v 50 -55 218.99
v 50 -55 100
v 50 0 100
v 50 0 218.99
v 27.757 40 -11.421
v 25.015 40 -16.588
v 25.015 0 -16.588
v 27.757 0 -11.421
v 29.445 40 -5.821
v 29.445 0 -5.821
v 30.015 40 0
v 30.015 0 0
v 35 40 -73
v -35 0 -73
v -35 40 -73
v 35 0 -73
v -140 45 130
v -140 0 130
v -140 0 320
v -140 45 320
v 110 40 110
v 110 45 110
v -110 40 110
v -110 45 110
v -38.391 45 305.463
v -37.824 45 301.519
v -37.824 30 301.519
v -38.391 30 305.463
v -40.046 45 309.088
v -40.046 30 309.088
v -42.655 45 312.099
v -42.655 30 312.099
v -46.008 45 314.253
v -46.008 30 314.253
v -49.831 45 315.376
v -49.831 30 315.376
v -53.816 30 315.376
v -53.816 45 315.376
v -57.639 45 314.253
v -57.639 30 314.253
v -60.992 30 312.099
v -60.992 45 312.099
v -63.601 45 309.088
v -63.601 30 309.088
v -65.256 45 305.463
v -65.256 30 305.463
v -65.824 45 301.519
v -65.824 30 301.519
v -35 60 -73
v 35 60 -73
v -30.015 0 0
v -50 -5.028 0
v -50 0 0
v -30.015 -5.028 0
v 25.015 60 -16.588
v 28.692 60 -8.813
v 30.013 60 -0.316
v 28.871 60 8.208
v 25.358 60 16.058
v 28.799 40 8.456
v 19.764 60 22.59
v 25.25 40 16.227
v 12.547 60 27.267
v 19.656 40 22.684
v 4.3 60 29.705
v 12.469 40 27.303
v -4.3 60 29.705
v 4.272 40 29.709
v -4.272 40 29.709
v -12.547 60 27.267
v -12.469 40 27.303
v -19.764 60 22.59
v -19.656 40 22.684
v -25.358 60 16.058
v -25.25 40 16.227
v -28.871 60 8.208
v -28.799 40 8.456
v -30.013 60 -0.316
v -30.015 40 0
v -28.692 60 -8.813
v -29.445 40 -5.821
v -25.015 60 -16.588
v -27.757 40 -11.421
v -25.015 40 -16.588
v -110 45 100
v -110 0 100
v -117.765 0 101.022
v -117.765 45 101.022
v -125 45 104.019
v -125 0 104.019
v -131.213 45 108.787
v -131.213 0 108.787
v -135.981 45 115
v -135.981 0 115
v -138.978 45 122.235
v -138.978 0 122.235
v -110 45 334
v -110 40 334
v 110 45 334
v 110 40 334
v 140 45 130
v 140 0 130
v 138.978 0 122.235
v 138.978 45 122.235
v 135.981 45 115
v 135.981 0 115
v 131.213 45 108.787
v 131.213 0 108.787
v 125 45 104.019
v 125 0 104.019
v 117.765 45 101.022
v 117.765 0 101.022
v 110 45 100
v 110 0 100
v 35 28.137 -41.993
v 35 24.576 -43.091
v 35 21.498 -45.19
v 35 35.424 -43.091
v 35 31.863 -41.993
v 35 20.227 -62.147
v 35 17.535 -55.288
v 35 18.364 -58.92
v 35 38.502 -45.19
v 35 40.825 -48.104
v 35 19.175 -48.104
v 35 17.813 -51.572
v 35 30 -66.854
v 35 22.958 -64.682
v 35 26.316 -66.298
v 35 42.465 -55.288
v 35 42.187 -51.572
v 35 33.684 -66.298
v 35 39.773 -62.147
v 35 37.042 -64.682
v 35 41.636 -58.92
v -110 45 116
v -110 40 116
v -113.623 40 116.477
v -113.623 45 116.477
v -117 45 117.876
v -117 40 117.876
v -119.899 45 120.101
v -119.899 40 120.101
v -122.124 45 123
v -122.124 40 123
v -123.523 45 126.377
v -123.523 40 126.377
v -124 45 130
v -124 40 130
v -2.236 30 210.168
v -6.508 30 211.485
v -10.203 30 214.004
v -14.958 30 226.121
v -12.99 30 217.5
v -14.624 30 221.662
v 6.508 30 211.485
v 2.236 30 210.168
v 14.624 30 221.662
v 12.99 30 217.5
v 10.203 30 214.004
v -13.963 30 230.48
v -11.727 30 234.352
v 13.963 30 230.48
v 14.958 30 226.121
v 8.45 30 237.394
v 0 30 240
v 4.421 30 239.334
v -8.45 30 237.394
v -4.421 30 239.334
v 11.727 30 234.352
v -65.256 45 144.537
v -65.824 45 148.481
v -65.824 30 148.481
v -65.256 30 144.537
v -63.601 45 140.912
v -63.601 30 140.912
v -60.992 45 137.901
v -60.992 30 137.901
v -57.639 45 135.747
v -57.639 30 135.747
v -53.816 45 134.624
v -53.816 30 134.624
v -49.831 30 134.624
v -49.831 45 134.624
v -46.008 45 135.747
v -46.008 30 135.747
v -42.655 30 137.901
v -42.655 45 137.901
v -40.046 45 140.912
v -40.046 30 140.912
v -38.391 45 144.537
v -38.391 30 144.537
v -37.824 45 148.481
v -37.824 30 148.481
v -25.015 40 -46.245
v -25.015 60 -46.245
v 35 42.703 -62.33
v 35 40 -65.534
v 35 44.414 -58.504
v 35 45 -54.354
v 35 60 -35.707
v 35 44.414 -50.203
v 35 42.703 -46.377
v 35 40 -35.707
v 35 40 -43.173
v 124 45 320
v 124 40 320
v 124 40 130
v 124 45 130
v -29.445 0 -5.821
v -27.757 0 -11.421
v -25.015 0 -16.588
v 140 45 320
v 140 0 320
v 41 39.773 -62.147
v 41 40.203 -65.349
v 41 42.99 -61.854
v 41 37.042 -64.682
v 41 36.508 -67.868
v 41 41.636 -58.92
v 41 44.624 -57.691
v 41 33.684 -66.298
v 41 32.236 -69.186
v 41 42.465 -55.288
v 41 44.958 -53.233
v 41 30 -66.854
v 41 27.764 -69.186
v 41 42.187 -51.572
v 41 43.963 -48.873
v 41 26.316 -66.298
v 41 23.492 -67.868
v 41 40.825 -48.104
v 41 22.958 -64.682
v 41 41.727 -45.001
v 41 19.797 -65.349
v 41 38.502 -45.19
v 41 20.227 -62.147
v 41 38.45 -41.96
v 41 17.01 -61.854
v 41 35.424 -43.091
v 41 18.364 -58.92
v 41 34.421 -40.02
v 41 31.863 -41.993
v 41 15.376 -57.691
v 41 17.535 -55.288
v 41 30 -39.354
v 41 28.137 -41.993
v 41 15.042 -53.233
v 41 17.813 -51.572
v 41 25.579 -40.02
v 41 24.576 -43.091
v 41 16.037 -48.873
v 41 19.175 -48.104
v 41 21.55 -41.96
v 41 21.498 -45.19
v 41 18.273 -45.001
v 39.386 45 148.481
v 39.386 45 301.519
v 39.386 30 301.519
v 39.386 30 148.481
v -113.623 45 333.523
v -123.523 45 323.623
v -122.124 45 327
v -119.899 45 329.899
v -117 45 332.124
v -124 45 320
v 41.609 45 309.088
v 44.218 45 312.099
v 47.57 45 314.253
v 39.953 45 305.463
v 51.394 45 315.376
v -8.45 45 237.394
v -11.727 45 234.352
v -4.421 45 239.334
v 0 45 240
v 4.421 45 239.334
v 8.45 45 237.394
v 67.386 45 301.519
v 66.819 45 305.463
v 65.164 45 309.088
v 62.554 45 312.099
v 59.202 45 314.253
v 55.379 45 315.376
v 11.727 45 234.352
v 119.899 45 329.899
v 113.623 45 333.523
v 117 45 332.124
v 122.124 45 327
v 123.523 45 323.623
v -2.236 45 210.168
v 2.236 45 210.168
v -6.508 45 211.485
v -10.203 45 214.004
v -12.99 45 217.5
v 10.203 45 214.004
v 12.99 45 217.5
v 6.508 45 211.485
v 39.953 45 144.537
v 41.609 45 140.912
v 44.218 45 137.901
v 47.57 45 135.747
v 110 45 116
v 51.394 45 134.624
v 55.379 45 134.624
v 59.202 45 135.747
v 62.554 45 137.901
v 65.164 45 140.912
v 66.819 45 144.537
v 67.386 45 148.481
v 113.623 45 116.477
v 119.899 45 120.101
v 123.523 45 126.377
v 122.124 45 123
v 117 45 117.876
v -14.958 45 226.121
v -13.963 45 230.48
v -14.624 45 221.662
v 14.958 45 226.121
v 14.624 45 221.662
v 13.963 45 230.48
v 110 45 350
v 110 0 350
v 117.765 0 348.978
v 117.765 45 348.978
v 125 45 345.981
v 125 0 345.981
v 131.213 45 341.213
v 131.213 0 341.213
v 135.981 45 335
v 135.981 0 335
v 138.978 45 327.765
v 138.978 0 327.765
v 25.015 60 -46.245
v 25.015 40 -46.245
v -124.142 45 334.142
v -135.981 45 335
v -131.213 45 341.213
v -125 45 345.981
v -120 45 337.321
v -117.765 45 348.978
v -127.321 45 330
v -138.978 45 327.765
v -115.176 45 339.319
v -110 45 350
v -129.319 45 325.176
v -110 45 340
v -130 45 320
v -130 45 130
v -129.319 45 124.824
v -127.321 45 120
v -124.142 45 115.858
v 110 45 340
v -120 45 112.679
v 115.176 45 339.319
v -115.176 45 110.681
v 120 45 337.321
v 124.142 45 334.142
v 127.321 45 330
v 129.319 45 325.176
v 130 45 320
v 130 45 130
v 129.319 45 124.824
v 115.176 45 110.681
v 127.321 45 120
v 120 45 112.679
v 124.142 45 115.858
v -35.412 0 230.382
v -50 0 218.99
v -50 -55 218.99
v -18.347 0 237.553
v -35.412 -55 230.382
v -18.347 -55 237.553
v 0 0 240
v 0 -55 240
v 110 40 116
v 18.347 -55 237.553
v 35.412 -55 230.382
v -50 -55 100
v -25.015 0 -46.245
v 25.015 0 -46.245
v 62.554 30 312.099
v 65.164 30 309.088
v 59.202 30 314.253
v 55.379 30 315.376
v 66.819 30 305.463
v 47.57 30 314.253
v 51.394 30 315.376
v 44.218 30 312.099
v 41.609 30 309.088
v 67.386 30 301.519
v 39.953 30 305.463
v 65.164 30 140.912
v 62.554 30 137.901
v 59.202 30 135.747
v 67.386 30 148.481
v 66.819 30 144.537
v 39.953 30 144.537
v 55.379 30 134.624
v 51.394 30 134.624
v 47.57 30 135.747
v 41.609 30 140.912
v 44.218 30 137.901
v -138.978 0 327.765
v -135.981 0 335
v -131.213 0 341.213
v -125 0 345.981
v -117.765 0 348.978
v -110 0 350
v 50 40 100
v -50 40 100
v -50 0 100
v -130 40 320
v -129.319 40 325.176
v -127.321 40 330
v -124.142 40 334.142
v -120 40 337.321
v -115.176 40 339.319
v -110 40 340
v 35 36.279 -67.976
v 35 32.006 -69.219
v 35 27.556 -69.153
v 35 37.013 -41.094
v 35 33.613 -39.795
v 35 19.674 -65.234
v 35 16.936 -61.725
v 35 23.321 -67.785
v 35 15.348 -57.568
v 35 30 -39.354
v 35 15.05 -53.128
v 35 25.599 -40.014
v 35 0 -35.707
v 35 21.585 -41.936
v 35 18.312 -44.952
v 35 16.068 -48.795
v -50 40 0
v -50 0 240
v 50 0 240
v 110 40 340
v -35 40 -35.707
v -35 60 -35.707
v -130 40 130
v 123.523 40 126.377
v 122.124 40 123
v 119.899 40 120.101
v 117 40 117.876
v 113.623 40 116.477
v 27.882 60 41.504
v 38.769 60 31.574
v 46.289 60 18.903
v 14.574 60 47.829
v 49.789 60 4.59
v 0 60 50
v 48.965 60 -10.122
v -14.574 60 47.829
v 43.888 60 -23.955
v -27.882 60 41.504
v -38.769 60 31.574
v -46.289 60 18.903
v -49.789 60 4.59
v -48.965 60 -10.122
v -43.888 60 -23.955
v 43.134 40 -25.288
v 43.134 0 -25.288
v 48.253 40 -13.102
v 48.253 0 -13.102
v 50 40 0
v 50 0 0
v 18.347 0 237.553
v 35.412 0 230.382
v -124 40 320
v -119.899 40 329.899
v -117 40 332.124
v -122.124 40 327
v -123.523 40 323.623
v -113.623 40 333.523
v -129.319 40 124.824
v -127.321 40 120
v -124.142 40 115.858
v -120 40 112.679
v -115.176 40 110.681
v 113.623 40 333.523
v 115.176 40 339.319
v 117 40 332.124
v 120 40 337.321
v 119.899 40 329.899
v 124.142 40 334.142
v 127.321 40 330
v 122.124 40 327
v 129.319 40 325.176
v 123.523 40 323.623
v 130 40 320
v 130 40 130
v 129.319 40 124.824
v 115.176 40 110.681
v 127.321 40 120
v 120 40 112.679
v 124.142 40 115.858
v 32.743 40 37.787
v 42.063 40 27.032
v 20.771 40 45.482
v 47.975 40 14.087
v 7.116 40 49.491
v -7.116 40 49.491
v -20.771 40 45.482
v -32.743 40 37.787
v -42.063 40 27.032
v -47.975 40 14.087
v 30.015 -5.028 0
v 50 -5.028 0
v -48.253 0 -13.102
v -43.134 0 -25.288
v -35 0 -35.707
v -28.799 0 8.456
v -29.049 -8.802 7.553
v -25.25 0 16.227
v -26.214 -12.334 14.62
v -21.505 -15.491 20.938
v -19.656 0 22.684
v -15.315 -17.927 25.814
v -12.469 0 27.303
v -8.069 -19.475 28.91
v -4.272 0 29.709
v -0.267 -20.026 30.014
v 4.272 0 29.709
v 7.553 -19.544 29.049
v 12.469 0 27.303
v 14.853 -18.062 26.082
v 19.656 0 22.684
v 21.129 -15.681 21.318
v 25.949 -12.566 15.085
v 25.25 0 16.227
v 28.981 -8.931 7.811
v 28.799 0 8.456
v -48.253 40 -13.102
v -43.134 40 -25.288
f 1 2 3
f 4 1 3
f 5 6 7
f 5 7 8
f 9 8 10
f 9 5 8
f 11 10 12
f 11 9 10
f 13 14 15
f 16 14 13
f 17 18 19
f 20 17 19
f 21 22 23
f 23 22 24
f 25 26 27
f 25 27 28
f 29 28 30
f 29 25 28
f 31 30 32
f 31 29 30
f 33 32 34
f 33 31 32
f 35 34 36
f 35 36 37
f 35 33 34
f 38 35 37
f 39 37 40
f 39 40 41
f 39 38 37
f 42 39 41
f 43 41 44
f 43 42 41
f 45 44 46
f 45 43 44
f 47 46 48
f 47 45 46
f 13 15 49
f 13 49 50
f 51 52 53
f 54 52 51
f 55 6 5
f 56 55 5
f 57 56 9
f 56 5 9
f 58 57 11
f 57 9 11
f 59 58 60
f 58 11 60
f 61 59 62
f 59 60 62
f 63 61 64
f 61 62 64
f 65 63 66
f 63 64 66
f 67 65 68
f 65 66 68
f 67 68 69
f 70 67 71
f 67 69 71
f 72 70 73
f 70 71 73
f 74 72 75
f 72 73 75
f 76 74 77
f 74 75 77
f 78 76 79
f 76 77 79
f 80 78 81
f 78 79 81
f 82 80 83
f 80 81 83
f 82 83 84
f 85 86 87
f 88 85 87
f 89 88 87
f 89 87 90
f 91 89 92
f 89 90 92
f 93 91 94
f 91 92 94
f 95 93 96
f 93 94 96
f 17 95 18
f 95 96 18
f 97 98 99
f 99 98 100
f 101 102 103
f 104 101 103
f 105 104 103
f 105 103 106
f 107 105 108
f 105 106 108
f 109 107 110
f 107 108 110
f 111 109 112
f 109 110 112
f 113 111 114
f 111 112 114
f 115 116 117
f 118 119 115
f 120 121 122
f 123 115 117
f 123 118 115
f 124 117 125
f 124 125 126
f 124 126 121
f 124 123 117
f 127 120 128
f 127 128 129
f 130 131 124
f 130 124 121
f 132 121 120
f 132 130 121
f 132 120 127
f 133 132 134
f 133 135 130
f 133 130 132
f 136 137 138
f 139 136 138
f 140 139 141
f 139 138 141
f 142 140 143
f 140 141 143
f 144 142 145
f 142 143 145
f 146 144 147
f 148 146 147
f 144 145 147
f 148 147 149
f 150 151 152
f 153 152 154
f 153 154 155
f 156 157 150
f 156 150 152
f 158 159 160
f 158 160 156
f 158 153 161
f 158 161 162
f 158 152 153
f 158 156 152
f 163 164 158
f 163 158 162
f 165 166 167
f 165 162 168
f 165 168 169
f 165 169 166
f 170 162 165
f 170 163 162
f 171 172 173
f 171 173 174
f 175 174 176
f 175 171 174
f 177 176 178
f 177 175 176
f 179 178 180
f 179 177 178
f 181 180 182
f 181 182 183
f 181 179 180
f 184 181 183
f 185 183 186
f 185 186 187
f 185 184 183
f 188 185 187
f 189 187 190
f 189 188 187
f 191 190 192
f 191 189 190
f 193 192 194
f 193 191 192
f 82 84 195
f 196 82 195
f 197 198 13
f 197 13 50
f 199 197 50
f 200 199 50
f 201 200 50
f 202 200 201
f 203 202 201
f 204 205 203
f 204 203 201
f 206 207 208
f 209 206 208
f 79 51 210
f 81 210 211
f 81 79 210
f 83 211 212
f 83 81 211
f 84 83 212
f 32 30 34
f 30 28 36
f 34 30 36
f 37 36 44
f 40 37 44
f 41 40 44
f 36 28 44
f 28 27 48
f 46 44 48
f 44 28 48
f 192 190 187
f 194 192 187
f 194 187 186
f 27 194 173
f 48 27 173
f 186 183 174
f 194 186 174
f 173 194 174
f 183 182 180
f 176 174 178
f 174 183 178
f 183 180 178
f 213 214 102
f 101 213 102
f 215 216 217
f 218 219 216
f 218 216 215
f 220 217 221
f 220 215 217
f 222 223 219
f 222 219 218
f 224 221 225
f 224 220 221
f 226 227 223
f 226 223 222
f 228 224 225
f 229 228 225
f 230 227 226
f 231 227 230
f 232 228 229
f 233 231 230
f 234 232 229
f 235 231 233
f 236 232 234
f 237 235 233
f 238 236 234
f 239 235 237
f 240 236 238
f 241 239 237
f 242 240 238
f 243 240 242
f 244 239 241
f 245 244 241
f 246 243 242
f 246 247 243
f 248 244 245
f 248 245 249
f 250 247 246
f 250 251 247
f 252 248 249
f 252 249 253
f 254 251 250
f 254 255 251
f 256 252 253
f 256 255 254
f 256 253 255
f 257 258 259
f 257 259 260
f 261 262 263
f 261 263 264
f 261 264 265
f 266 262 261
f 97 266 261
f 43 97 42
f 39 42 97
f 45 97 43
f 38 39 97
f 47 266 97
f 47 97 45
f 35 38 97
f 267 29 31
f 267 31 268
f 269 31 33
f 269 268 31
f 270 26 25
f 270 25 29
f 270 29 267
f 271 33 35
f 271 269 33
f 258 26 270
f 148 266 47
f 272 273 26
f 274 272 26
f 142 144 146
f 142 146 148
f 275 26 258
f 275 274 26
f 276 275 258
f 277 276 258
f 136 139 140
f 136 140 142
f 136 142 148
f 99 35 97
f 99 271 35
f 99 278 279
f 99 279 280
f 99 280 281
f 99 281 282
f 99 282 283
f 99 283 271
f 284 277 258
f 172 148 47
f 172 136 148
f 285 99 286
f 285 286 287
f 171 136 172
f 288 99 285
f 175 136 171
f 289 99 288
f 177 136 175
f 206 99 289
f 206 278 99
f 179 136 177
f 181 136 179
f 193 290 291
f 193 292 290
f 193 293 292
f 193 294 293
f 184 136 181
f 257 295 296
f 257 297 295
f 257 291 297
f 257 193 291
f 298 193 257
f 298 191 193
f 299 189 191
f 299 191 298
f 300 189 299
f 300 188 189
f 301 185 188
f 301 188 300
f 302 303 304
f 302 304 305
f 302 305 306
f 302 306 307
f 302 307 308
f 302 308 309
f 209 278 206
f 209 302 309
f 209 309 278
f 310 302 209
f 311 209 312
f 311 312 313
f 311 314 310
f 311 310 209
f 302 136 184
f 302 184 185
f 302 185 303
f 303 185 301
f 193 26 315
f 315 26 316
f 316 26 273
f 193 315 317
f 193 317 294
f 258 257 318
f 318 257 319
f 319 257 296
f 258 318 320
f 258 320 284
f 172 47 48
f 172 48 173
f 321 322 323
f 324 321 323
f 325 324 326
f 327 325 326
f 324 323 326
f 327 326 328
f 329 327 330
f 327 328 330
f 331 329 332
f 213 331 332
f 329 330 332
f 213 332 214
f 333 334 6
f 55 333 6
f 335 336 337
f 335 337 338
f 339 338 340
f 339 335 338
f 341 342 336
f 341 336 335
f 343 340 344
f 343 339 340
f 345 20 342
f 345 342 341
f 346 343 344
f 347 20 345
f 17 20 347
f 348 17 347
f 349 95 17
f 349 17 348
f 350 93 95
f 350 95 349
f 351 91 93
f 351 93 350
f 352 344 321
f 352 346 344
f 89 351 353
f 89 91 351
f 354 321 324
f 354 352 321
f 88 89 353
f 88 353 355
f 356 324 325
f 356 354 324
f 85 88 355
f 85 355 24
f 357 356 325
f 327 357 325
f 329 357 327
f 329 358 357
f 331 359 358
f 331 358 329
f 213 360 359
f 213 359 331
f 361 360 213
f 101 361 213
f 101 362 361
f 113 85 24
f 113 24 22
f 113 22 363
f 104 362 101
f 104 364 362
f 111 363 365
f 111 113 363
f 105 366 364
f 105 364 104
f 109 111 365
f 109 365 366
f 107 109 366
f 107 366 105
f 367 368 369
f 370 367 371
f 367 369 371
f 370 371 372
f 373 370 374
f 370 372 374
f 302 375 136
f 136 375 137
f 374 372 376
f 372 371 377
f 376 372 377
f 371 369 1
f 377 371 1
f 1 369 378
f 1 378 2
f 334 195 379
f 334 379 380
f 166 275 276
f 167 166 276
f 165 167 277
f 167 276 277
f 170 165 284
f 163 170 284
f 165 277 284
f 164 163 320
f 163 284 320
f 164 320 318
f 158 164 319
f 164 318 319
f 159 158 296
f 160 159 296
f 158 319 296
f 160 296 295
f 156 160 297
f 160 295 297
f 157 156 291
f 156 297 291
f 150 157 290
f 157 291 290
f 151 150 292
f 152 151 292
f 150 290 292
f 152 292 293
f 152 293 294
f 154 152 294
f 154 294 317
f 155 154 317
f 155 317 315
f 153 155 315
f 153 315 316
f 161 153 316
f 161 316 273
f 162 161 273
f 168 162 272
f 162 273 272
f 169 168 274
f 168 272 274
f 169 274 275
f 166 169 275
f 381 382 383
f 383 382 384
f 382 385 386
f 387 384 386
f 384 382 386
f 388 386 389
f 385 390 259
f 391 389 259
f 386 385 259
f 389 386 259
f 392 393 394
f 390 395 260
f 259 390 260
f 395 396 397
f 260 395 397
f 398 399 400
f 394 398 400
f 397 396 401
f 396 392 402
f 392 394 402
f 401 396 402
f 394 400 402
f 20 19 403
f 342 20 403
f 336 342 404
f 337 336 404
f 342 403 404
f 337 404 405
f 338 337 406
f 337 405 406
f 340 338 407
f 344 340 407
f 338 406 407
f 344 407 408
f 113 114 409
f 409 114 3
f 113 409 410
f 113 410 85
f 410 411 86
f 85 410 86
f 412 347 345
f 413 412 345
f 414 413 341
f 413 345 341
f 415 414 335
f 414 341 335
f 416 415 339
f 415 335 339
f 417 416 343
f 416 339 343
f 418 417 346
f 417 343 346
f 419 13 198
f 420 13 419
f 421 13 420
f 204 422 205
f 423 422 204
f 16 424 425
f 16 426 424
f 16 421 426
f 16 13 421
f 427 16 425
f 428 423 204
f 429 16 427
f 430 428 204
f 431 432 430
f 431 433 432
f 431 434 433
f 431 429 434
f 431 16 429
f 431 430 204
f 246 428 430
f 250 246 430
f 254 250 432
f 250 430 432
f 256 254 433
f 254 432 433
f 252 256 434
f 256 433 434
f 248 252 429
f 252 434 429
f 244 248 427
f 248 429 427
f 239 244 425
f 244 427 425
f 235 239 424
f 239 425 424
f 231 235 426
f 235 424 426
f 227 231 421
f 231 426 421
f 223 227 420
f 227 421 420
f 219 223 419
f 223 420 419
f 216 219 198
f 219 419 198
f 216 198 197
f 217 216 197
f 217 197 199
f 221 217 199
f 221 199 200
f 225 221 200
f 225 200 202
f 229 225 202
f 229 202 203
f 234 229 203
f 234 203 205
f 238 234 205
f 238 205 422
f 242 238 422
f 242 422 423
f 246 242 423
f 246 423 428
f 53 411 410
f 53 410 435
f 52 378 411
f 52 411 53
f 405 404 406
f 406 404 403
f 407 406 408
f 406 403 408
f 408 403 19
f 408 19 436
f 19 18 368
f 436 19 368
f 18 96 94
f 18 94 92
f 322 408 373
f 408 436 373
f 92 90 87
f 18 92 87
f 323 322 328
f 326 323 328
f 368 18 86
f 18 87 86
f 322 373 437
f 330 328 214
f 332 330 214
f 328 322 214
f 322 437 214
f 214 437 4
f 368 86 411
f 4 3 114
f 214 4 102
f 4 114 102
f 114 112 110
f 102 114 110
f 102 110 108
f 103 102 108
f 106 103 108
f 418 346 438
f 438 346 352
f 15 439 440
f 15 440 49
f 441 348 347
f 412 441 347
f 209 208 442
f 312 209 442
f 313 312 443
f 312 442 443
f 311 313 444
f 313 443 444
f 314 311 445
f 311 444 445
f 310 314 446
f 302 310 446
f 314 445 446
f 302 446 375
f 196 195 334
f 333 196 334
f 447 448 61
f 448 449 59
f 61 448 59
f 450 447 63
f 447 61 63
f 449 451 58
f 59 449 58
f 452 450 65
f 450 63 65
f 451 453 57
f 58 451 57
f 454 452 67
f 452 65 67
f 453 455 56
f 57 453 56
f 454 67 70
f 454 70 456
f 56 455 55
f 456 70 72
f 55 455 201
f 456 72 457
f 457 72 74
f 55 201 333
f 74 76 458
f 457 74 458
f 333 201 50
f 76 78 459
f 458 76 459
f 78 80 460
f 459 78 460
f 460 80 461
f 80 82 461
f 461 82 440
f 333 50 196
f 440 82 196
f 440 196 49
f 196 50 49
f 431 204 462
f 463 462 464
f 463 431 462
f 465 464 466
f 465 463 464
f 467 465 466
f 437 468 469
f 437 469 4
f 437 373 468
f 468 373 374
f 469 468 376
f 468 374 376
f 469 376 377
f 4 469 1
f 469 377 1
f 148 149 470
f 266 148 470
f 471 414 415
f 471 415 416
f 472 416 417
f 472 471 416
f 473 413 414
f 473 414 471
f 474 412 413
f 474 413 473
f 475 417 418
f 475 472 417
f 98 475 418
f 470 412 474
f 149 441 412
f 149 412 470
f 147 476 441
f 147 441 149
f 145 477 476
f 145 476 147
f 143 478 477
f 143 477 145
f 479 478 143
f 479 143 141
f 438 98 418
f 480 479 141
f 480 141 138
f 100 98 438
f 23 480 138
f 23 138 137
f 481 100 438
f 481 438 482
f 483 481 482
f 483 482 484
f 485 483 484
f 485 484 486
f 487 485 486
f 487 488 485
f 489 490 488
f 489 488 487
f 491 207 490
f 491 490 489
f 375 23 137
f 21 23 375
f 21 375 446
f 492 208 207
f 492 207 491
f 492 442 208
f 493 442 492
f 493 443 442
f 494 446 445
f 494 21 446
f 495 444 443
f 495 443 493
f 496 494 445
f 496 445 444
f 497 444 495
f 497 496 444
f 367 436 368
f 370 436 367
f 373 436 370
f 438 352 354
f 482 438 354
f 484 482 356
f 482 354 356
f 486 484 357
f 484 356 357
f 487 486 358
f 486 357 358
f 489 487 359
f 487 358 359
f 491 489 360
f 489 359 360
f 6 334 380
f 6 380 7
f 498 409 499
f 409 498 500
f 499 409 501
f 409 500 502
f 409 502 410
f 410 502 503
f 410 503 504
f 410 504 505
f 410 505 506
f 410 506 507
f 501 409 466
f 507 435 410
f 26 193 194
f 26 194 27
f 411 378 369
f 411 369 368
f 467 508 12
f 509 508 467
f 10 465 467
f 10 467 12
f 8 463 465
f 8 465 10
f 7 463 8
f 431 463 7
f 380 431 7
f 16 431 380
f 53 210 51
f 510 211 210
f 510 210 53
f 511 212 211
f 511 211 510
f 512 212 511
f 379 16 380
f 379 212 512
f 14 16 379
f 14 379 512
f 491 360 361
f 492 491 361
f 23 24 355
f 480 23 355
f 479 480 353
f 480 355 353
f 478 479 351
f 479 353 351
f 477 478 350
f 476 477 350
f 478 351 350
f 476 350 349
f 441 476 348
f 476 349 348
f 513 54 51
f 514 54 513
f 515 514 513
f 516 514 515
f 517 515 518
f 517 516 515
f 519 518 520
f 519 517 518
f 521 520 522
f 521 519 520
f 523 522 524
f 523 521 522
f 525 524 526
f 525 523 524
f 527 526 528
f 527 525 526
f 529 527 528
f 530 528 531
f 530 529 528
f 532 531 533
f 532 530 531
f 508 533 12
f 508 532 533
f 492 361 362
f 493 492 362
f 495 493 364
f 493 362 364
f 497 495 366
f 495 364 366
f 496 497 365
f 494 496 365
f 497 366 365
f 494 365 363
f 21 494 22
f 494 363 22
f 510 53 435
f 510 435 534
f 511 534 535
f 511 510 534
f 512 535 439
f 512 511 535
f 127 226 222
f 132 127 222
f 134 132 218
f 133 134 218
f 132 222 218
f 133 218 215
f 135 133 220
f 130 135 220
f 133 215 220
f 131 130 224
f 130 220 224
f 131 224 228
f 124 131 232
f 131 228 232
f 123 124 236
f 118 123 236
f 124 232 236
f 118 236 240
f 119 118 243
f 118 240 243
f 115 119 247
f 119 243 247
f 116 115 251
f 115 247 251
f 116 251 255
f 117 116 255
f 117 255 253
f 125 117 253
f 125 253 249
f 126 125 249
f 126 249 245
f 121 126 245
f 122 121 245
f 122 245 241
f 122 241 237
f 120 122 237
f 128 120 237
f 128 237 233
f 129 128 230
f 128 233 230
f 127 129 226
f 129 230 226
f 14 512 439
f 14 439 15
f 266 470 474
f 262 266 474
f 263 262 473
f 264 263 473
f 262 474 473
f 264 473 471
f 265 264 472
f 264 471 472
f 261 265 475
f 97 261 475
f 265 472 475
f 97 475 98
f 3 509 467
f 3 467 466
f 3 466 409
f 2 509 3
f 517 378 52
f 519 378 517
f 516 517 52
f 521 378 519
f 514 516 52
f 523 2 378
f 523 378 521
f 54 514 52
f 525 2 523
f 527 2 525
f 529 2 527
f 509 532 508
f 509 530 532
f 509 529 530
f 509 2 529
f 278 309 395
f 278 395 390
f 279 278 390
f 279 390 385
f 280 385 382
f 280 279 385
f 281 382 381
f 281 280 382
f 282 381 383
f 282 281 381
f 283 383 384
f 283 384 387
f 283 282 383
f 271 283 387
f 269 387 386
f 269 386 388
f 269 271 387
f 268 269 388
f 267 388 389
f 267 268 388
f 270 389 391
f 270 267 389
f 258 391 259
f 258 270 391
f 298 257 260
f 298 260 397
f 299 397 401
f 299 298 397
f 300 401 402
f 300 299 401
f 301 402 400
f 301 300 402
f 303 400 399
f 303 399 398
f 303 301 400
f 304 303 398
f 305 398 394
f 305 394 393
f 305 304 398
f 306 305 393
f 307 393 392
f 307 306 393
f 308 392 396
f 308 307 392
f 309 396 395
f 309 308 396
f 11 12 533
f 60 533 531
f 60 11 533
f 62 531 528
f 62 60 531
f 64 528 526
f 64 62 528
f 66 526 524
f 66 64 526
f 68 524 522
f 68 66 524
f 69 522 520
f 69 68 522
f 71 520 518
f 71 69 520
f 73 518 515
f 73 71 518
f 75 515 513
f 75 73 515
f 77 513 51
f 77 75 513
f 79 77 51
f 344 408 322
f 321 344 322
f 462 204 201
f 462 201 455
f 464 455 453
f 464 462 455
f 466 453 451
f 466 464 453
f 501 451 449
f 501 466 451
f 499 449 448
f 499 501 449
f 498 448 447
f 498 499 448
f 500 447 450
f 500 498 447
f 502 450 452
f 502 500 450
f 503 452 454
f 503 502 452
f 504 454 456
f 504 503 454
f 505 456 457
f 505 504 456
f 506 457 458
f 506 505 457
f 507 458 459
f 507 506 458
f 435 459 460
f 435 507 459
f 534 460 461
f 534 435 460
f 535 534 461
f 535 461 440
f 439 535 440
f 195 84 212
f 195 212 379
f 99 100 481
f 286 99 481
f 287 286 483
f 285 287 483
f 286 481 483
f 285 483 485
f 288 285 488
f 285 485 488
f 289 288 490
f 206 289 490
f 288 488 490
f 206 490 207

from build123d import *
from build123d.topology import SkipClean

# Parameters (mm, degrees)
BOSS_EXTRUDE1_DEPTH      = 40
CUT_EXTRUDE1_DEPTH       = 66
BOSS_EXTRUDE2_START      = -55
BOSS_EXTRUDE2_DEPTH      = 95
CUT_EXTRUDE2_DEPTH       = 256
BOSS_EXTRUDE3_DEPTH      = 5
BOSS_EXTRUDE3_DEPTH_BACK = 40
BOSS_EXTRUDE4_DEPTH      = 20
CUT_EXTRUDE3_DEPTH       = 5
BOSS_EXTRUDE5_DEPTH      = 5
SKETCH9_R                = 15
CUT_EXTRUDE5_DEPTH       = 15
SKETCH10_W               = 100
SKETCH10_H               = 55
BOSS_EXTRUDE6_DEPTH      = 140
CUT_EXTRUDE6_DEPTH       = 55
SKETCH12_R               = 15
BOSS_EXTRUDE7_DEPTH      = 6
SKETCH13_R               = 12.5
CUT_EXTRUDE7_DEPTH       = 6


with BuildPart() as part:
    # Sketch1 → Boss-Extrude1 (new body)
    with BuildSketch(Plane(origin=(0, 0, 0), x_dir=(1, 0, 0), z_dir=(0, 1, 0))):
        with BuildLine():
            Line((-35, 73), (35, 73))
            Line((35, 73), (35, 35.707142143))
            ThreePointArc((35, 35.707142143), (0, -50), (-35, 35.707142143))
            Line((-35, 35.707142143), (-35, 73))
        make_face()
    extrude(amount=BOSS_EXTRUDE1_DEPTH)

    # Sketch2 → Cut-Extrude1 (cut)
    with BuildSketch(Plane(origin=(0, 40, 0), x_dir=(1, 0, 0), z_dir=(0, 1, 0))):
        with BuildLine():
            Line((-25.015, 16.587646005), (-25.015, 46.245))
            Line((-25.015, 46.245), (25.015, 46.245))
            Line((25.015, 46.245), (25.015, 16.587646005))
            ThreePointArc((25.015, 16.587646005), (0, -30.015), (-25.015, 16.587646005))
        make_face()
    extrude(amount=-CUT_EXTRUDE1_DEPTH, mode=Mode.SUBTRACT)

    # Sketch3 → Boss-Extrude2 (add)
    with SkipClean():  # the faces are left unmerged after this step: merging them gives an invalid solid
        with BuildSketch(Plane(origin=(0, 0, 0), x_dir=(1, 0, 0), z_dir=(0, 1, 0)).offset(BOSS_EXTRUDE2_START)):
            with BuildLine():
                Line((30.015, 0), (50, 0))
                Line((50, 0), (50, -100))
                Line((50, -100), (-50, -100))
                Line((-50, -100), (-50, 0))
                Line((-50, 0), (-30.015, 0))
                ThreePointArc((-30.015, 0), (0, -30.015), (30.015, 0))
            make_face()
        extrude(amount=BOSS_EXTRUDE2_DEPTH)

    # Sketch4 → Cut-Extrude2 (cut)
    with SkipClean():  # the faces are left unmerged after this step: merging them gives an invalid solid
        with BuildSketch(Plane(origin=(50, 0, 0), x_dir=(0, 0, -1), z_dir=(1, 0, 0))):
            Polygon((-100, -55), (0, -5.02758566), (0, -55), align=None)
        extrude(amount=-CUT_EXTRUDE2_DEPTH, mode=Mode.SUBTRACT)

    # Sketch5 → Boss-Extrude3 (add, two sides: drawn at the far end of the back side and taken through both)
    with SkipClean():  # the faces are left unmerged after this step: merging them gives an invalid solid
        with BuildSketch(Plane(origin=(0, 40, 0), x_dir=(1, 0, 0), z_dir=(0, 1, 0)).offset(-BOSS_EXTRUDE3_DEPTH_BACK)):
            with BuildLine():
                Line((-110, -350), (110, -350))
                ThreePointArc((110, -350), (131.213203436, -341.213203436), (140, -320))
                Line((140, -320), (140, -130))
                ThreePointArc((140, -130), (131.213203436, -108.786796564), (110, -100))
                Line((110, -100), (-110, -100))
                ThreePointArc((-110, -100), (-131.213203436, -108.786796564), (-140, -130))
                Line((-140, -130), (-140, -320))
                ThreePointArc((-140, -320), (-131.213203436, -341.213203436), (-110, -350))
            make_face()
        extrude(amount=BOSS_EXTRUDE3_DEPTH + BOSS_EXTRUDE3_DEPTH_BACK)

    # Sketch6 → Boss-Extrude4 (add)
    with SkipClean():  # the faces are left unmerged after this step: merging them gives an invalid solid
        with BuildSketch(Plane(origin=(0, 40, 0), x_dir=(1, 0, 0), z_dir=(0, 1, 0))):
            with BuildLine():
                Line((-35, 35.707142143), (-35, 73))
                Line((-35, 73), (35, 73))
                Line((35, 73), (35, 35.707142143))
                ThreePointArc((35, 35.707142143), (0, -50), (-35, 35.707142143))
            make_face()
            with BuildLine():
                Line((-25.015, 16.587646005), (-25.015, 46.245))
                Line((-25.015, 46.245), (25.015, 46.245))
                Line((25.015, 46.245), (25.015, 16.587646005))
                ThreePointArc((25.015, 16.587646005), (0, -30.015), (-25.015, 16.587646005))
            make_face(mode=Mode.SUBTRACT)
        extrude(amount=BOSS_EXTRUDE4_DEPTH)

    # Sketch7 → Cut-Extrude3 (cut)
    with SkipClean():  # the faces are left unmerged after this step: merging them gives an invalid solid
        with BuildSketch(Plane(origin=(0, 45, 0), x_dir=(1, 0, 0), z_dir=(0, 1, 0))):
            with BuildLine():
                Line((130, -320), (130, -130))
                ThreePointArc((130, -130), (124.142135624, -115.857864376), (110, -110))
                Line((110, -110), (-110, -110))
                ThreePointArc((-110, -110), (-124.142135624, -115.857864376), (-130, -130))
                Line((-130, -130), (-130, -320))
                ThreePointArc((-130, -320), (-124.142135624, -334.142135624), (-110, -340))
                Line((-110, -340), (110, -340))
                ThreePointArc((110, -340), (124.142135624, -334.142135624), (130, -320))
            make_face()
        extrude(amount=-CUT_EXTRUDE3_DEPTH, mode=Mode.SUBTRACT)

    # Sketch8 → Boss-Extrude5 (add)
    with SkipClean():  # the faces are left unmerged after this step: merging them gives an invalid solid
        with BuildSketch(Plane(origin=(0, 40, 0), x_dir=(1, 0, 0), z_dir=(0, 1, 0))):
            with BuildLine():
                Line((124, -320), (124, -130))
                ThreePointArc((124, -130), (119.899494937, -120.100505063), (110, -116))
                Line((110, -116), (-110, -116))
                ThreePointArc((-110, -116), (-119.899494937, -120.100505063), (-124, -130))
                Line((-124, -130), (-124, -320))
                ThreePointArc((-124, -320), (-119.899494937, -329.899494937), (-110, -334))
                Line((-110, -334), (110, -334))
                ThreePointArc((110, -334), (119.899494937, -329.899494937), (124, -320))
            make_face()
        extrude(amount=BOSS_EXTRUDE5_DEPTH)

    # Sketch9 → Cut-Extrude5 (cut)
    with SkipClean():  # the faces are left unmerged after this step: merging them gives an invalid solid
        with BuildSketch(Plane(origin=(0, 45, 0), x_dir=(1, 0, 0), z_dir=(0, 1, 0))):
            with Locations(Location((0, -225, 0), (0, 0, 270))):
                Circle(SKETCH9_R)
            with BuildLine():
                Line((-65.823520443, -301.518564523), (-65.823520443, -148.481435477))
                ThreePointArc((-65.823520443, -148.481435477), (-51.823520443, -134.481435477), (-37.823520443, -148.481435477))
                Line((-37.823520443, -148.481435477), (-37.823520443, -301.518564523))
                ThreePointArc((-37.823520443, -301.518564523), (-51.823520443, -315.518564523), (-65.823520443, -301.518564523))
            make_face()
            with BuildLine():
                Line((39.386204855, -301.518564523), (39.386204855, -148.481435477))
                ThreePointArc((39.386204855, -148.481435477), (53.386204855, -134.481435477), (67.386204855, -148.481435477))
                Line((67.386204855, -148.481435477), (67.386204855, -301.518564523))
                ThreePointArc((67.386204855, -301.518564523), (53.386204855, -315.518564523), (39.386204855, -301.518564523))
            make_face()
        extrude(amount=-CUT_EXTRUDE5_DEPTH, mode=Mode.SUBTRACT)

    # Sketch10 → Boss-Extrude6 (add)
    with SkipClean():  # the faces are left unmerged after this step: merging them gives an invalid solid
        with BuildSketch(Plane.XY.offset(100)):
            with Locations((0, -27.5)):
                Rectangle(SKETCH10_W, SKETCH10_H)
        extrude(amount=BOSS_EXTRUDE6_DEPTH)

    # Sketch11 → Cut-Extrude6 (cut)
    with SkipClean():  # the faces are left unmerged after this step: merging them gives an invalid solid
        with BuildSketch(Plane.XZ.offset(55)):
            with BuildLine():
                Line((50, 240), (0, 240))
                ThreePointArc((0, 240), (27.117470016, 234.534043883), (50, 218.989794856))
                Line((50, 218.989794856), (50, 240))
            make_face()
            with BuildLine():
                Line((0, 240), (-50, 240))
                Line((-50, 240), (-50, 218.989794856))
                ThreePointArc((-50, 218.989794856), (-27.117470016, 234.534043883), (0, 240))
            make_face()
        extrude(amount=-CUT_EXTRUDE6_DEPTH, mode=Mode.SUBTRACT)

    # Sketch12 → Boss-Extrude7 (add)
    with SkipClean():  # the faces are left unmerged after this step: merging them gives an invalid solid
        with BuildSketch(Plane(origin=(35, 0, 0), x_dir=(0, 0, -1), z_dir=(1, 0, 0))):
            with Locations(Location((54.353571071, 30, 0), (0, 0, 180))):
                Circle(SKETCH12_R)
        extrude(amount=BOSS_EXTRUDE7_DEPTH)

    # Sketch13 → Cut-Extrude7 (cut)
    with SkipClean():  # the faces are left unmerged after this step: merging them gives an invalid solid
        with BuildSketch(Plane(origin=(41, 0, 0), x_dir=(0, 0, -1), z_dir=(1, 0, 0))):
            with Locations((54.353571071, 30)):
                Circle(SKETCH13_R)
        extrude(amount=-CUT_EXTRUDE7_DEPTH, mode=Mode.SUBTRACT)


solid = part.part
